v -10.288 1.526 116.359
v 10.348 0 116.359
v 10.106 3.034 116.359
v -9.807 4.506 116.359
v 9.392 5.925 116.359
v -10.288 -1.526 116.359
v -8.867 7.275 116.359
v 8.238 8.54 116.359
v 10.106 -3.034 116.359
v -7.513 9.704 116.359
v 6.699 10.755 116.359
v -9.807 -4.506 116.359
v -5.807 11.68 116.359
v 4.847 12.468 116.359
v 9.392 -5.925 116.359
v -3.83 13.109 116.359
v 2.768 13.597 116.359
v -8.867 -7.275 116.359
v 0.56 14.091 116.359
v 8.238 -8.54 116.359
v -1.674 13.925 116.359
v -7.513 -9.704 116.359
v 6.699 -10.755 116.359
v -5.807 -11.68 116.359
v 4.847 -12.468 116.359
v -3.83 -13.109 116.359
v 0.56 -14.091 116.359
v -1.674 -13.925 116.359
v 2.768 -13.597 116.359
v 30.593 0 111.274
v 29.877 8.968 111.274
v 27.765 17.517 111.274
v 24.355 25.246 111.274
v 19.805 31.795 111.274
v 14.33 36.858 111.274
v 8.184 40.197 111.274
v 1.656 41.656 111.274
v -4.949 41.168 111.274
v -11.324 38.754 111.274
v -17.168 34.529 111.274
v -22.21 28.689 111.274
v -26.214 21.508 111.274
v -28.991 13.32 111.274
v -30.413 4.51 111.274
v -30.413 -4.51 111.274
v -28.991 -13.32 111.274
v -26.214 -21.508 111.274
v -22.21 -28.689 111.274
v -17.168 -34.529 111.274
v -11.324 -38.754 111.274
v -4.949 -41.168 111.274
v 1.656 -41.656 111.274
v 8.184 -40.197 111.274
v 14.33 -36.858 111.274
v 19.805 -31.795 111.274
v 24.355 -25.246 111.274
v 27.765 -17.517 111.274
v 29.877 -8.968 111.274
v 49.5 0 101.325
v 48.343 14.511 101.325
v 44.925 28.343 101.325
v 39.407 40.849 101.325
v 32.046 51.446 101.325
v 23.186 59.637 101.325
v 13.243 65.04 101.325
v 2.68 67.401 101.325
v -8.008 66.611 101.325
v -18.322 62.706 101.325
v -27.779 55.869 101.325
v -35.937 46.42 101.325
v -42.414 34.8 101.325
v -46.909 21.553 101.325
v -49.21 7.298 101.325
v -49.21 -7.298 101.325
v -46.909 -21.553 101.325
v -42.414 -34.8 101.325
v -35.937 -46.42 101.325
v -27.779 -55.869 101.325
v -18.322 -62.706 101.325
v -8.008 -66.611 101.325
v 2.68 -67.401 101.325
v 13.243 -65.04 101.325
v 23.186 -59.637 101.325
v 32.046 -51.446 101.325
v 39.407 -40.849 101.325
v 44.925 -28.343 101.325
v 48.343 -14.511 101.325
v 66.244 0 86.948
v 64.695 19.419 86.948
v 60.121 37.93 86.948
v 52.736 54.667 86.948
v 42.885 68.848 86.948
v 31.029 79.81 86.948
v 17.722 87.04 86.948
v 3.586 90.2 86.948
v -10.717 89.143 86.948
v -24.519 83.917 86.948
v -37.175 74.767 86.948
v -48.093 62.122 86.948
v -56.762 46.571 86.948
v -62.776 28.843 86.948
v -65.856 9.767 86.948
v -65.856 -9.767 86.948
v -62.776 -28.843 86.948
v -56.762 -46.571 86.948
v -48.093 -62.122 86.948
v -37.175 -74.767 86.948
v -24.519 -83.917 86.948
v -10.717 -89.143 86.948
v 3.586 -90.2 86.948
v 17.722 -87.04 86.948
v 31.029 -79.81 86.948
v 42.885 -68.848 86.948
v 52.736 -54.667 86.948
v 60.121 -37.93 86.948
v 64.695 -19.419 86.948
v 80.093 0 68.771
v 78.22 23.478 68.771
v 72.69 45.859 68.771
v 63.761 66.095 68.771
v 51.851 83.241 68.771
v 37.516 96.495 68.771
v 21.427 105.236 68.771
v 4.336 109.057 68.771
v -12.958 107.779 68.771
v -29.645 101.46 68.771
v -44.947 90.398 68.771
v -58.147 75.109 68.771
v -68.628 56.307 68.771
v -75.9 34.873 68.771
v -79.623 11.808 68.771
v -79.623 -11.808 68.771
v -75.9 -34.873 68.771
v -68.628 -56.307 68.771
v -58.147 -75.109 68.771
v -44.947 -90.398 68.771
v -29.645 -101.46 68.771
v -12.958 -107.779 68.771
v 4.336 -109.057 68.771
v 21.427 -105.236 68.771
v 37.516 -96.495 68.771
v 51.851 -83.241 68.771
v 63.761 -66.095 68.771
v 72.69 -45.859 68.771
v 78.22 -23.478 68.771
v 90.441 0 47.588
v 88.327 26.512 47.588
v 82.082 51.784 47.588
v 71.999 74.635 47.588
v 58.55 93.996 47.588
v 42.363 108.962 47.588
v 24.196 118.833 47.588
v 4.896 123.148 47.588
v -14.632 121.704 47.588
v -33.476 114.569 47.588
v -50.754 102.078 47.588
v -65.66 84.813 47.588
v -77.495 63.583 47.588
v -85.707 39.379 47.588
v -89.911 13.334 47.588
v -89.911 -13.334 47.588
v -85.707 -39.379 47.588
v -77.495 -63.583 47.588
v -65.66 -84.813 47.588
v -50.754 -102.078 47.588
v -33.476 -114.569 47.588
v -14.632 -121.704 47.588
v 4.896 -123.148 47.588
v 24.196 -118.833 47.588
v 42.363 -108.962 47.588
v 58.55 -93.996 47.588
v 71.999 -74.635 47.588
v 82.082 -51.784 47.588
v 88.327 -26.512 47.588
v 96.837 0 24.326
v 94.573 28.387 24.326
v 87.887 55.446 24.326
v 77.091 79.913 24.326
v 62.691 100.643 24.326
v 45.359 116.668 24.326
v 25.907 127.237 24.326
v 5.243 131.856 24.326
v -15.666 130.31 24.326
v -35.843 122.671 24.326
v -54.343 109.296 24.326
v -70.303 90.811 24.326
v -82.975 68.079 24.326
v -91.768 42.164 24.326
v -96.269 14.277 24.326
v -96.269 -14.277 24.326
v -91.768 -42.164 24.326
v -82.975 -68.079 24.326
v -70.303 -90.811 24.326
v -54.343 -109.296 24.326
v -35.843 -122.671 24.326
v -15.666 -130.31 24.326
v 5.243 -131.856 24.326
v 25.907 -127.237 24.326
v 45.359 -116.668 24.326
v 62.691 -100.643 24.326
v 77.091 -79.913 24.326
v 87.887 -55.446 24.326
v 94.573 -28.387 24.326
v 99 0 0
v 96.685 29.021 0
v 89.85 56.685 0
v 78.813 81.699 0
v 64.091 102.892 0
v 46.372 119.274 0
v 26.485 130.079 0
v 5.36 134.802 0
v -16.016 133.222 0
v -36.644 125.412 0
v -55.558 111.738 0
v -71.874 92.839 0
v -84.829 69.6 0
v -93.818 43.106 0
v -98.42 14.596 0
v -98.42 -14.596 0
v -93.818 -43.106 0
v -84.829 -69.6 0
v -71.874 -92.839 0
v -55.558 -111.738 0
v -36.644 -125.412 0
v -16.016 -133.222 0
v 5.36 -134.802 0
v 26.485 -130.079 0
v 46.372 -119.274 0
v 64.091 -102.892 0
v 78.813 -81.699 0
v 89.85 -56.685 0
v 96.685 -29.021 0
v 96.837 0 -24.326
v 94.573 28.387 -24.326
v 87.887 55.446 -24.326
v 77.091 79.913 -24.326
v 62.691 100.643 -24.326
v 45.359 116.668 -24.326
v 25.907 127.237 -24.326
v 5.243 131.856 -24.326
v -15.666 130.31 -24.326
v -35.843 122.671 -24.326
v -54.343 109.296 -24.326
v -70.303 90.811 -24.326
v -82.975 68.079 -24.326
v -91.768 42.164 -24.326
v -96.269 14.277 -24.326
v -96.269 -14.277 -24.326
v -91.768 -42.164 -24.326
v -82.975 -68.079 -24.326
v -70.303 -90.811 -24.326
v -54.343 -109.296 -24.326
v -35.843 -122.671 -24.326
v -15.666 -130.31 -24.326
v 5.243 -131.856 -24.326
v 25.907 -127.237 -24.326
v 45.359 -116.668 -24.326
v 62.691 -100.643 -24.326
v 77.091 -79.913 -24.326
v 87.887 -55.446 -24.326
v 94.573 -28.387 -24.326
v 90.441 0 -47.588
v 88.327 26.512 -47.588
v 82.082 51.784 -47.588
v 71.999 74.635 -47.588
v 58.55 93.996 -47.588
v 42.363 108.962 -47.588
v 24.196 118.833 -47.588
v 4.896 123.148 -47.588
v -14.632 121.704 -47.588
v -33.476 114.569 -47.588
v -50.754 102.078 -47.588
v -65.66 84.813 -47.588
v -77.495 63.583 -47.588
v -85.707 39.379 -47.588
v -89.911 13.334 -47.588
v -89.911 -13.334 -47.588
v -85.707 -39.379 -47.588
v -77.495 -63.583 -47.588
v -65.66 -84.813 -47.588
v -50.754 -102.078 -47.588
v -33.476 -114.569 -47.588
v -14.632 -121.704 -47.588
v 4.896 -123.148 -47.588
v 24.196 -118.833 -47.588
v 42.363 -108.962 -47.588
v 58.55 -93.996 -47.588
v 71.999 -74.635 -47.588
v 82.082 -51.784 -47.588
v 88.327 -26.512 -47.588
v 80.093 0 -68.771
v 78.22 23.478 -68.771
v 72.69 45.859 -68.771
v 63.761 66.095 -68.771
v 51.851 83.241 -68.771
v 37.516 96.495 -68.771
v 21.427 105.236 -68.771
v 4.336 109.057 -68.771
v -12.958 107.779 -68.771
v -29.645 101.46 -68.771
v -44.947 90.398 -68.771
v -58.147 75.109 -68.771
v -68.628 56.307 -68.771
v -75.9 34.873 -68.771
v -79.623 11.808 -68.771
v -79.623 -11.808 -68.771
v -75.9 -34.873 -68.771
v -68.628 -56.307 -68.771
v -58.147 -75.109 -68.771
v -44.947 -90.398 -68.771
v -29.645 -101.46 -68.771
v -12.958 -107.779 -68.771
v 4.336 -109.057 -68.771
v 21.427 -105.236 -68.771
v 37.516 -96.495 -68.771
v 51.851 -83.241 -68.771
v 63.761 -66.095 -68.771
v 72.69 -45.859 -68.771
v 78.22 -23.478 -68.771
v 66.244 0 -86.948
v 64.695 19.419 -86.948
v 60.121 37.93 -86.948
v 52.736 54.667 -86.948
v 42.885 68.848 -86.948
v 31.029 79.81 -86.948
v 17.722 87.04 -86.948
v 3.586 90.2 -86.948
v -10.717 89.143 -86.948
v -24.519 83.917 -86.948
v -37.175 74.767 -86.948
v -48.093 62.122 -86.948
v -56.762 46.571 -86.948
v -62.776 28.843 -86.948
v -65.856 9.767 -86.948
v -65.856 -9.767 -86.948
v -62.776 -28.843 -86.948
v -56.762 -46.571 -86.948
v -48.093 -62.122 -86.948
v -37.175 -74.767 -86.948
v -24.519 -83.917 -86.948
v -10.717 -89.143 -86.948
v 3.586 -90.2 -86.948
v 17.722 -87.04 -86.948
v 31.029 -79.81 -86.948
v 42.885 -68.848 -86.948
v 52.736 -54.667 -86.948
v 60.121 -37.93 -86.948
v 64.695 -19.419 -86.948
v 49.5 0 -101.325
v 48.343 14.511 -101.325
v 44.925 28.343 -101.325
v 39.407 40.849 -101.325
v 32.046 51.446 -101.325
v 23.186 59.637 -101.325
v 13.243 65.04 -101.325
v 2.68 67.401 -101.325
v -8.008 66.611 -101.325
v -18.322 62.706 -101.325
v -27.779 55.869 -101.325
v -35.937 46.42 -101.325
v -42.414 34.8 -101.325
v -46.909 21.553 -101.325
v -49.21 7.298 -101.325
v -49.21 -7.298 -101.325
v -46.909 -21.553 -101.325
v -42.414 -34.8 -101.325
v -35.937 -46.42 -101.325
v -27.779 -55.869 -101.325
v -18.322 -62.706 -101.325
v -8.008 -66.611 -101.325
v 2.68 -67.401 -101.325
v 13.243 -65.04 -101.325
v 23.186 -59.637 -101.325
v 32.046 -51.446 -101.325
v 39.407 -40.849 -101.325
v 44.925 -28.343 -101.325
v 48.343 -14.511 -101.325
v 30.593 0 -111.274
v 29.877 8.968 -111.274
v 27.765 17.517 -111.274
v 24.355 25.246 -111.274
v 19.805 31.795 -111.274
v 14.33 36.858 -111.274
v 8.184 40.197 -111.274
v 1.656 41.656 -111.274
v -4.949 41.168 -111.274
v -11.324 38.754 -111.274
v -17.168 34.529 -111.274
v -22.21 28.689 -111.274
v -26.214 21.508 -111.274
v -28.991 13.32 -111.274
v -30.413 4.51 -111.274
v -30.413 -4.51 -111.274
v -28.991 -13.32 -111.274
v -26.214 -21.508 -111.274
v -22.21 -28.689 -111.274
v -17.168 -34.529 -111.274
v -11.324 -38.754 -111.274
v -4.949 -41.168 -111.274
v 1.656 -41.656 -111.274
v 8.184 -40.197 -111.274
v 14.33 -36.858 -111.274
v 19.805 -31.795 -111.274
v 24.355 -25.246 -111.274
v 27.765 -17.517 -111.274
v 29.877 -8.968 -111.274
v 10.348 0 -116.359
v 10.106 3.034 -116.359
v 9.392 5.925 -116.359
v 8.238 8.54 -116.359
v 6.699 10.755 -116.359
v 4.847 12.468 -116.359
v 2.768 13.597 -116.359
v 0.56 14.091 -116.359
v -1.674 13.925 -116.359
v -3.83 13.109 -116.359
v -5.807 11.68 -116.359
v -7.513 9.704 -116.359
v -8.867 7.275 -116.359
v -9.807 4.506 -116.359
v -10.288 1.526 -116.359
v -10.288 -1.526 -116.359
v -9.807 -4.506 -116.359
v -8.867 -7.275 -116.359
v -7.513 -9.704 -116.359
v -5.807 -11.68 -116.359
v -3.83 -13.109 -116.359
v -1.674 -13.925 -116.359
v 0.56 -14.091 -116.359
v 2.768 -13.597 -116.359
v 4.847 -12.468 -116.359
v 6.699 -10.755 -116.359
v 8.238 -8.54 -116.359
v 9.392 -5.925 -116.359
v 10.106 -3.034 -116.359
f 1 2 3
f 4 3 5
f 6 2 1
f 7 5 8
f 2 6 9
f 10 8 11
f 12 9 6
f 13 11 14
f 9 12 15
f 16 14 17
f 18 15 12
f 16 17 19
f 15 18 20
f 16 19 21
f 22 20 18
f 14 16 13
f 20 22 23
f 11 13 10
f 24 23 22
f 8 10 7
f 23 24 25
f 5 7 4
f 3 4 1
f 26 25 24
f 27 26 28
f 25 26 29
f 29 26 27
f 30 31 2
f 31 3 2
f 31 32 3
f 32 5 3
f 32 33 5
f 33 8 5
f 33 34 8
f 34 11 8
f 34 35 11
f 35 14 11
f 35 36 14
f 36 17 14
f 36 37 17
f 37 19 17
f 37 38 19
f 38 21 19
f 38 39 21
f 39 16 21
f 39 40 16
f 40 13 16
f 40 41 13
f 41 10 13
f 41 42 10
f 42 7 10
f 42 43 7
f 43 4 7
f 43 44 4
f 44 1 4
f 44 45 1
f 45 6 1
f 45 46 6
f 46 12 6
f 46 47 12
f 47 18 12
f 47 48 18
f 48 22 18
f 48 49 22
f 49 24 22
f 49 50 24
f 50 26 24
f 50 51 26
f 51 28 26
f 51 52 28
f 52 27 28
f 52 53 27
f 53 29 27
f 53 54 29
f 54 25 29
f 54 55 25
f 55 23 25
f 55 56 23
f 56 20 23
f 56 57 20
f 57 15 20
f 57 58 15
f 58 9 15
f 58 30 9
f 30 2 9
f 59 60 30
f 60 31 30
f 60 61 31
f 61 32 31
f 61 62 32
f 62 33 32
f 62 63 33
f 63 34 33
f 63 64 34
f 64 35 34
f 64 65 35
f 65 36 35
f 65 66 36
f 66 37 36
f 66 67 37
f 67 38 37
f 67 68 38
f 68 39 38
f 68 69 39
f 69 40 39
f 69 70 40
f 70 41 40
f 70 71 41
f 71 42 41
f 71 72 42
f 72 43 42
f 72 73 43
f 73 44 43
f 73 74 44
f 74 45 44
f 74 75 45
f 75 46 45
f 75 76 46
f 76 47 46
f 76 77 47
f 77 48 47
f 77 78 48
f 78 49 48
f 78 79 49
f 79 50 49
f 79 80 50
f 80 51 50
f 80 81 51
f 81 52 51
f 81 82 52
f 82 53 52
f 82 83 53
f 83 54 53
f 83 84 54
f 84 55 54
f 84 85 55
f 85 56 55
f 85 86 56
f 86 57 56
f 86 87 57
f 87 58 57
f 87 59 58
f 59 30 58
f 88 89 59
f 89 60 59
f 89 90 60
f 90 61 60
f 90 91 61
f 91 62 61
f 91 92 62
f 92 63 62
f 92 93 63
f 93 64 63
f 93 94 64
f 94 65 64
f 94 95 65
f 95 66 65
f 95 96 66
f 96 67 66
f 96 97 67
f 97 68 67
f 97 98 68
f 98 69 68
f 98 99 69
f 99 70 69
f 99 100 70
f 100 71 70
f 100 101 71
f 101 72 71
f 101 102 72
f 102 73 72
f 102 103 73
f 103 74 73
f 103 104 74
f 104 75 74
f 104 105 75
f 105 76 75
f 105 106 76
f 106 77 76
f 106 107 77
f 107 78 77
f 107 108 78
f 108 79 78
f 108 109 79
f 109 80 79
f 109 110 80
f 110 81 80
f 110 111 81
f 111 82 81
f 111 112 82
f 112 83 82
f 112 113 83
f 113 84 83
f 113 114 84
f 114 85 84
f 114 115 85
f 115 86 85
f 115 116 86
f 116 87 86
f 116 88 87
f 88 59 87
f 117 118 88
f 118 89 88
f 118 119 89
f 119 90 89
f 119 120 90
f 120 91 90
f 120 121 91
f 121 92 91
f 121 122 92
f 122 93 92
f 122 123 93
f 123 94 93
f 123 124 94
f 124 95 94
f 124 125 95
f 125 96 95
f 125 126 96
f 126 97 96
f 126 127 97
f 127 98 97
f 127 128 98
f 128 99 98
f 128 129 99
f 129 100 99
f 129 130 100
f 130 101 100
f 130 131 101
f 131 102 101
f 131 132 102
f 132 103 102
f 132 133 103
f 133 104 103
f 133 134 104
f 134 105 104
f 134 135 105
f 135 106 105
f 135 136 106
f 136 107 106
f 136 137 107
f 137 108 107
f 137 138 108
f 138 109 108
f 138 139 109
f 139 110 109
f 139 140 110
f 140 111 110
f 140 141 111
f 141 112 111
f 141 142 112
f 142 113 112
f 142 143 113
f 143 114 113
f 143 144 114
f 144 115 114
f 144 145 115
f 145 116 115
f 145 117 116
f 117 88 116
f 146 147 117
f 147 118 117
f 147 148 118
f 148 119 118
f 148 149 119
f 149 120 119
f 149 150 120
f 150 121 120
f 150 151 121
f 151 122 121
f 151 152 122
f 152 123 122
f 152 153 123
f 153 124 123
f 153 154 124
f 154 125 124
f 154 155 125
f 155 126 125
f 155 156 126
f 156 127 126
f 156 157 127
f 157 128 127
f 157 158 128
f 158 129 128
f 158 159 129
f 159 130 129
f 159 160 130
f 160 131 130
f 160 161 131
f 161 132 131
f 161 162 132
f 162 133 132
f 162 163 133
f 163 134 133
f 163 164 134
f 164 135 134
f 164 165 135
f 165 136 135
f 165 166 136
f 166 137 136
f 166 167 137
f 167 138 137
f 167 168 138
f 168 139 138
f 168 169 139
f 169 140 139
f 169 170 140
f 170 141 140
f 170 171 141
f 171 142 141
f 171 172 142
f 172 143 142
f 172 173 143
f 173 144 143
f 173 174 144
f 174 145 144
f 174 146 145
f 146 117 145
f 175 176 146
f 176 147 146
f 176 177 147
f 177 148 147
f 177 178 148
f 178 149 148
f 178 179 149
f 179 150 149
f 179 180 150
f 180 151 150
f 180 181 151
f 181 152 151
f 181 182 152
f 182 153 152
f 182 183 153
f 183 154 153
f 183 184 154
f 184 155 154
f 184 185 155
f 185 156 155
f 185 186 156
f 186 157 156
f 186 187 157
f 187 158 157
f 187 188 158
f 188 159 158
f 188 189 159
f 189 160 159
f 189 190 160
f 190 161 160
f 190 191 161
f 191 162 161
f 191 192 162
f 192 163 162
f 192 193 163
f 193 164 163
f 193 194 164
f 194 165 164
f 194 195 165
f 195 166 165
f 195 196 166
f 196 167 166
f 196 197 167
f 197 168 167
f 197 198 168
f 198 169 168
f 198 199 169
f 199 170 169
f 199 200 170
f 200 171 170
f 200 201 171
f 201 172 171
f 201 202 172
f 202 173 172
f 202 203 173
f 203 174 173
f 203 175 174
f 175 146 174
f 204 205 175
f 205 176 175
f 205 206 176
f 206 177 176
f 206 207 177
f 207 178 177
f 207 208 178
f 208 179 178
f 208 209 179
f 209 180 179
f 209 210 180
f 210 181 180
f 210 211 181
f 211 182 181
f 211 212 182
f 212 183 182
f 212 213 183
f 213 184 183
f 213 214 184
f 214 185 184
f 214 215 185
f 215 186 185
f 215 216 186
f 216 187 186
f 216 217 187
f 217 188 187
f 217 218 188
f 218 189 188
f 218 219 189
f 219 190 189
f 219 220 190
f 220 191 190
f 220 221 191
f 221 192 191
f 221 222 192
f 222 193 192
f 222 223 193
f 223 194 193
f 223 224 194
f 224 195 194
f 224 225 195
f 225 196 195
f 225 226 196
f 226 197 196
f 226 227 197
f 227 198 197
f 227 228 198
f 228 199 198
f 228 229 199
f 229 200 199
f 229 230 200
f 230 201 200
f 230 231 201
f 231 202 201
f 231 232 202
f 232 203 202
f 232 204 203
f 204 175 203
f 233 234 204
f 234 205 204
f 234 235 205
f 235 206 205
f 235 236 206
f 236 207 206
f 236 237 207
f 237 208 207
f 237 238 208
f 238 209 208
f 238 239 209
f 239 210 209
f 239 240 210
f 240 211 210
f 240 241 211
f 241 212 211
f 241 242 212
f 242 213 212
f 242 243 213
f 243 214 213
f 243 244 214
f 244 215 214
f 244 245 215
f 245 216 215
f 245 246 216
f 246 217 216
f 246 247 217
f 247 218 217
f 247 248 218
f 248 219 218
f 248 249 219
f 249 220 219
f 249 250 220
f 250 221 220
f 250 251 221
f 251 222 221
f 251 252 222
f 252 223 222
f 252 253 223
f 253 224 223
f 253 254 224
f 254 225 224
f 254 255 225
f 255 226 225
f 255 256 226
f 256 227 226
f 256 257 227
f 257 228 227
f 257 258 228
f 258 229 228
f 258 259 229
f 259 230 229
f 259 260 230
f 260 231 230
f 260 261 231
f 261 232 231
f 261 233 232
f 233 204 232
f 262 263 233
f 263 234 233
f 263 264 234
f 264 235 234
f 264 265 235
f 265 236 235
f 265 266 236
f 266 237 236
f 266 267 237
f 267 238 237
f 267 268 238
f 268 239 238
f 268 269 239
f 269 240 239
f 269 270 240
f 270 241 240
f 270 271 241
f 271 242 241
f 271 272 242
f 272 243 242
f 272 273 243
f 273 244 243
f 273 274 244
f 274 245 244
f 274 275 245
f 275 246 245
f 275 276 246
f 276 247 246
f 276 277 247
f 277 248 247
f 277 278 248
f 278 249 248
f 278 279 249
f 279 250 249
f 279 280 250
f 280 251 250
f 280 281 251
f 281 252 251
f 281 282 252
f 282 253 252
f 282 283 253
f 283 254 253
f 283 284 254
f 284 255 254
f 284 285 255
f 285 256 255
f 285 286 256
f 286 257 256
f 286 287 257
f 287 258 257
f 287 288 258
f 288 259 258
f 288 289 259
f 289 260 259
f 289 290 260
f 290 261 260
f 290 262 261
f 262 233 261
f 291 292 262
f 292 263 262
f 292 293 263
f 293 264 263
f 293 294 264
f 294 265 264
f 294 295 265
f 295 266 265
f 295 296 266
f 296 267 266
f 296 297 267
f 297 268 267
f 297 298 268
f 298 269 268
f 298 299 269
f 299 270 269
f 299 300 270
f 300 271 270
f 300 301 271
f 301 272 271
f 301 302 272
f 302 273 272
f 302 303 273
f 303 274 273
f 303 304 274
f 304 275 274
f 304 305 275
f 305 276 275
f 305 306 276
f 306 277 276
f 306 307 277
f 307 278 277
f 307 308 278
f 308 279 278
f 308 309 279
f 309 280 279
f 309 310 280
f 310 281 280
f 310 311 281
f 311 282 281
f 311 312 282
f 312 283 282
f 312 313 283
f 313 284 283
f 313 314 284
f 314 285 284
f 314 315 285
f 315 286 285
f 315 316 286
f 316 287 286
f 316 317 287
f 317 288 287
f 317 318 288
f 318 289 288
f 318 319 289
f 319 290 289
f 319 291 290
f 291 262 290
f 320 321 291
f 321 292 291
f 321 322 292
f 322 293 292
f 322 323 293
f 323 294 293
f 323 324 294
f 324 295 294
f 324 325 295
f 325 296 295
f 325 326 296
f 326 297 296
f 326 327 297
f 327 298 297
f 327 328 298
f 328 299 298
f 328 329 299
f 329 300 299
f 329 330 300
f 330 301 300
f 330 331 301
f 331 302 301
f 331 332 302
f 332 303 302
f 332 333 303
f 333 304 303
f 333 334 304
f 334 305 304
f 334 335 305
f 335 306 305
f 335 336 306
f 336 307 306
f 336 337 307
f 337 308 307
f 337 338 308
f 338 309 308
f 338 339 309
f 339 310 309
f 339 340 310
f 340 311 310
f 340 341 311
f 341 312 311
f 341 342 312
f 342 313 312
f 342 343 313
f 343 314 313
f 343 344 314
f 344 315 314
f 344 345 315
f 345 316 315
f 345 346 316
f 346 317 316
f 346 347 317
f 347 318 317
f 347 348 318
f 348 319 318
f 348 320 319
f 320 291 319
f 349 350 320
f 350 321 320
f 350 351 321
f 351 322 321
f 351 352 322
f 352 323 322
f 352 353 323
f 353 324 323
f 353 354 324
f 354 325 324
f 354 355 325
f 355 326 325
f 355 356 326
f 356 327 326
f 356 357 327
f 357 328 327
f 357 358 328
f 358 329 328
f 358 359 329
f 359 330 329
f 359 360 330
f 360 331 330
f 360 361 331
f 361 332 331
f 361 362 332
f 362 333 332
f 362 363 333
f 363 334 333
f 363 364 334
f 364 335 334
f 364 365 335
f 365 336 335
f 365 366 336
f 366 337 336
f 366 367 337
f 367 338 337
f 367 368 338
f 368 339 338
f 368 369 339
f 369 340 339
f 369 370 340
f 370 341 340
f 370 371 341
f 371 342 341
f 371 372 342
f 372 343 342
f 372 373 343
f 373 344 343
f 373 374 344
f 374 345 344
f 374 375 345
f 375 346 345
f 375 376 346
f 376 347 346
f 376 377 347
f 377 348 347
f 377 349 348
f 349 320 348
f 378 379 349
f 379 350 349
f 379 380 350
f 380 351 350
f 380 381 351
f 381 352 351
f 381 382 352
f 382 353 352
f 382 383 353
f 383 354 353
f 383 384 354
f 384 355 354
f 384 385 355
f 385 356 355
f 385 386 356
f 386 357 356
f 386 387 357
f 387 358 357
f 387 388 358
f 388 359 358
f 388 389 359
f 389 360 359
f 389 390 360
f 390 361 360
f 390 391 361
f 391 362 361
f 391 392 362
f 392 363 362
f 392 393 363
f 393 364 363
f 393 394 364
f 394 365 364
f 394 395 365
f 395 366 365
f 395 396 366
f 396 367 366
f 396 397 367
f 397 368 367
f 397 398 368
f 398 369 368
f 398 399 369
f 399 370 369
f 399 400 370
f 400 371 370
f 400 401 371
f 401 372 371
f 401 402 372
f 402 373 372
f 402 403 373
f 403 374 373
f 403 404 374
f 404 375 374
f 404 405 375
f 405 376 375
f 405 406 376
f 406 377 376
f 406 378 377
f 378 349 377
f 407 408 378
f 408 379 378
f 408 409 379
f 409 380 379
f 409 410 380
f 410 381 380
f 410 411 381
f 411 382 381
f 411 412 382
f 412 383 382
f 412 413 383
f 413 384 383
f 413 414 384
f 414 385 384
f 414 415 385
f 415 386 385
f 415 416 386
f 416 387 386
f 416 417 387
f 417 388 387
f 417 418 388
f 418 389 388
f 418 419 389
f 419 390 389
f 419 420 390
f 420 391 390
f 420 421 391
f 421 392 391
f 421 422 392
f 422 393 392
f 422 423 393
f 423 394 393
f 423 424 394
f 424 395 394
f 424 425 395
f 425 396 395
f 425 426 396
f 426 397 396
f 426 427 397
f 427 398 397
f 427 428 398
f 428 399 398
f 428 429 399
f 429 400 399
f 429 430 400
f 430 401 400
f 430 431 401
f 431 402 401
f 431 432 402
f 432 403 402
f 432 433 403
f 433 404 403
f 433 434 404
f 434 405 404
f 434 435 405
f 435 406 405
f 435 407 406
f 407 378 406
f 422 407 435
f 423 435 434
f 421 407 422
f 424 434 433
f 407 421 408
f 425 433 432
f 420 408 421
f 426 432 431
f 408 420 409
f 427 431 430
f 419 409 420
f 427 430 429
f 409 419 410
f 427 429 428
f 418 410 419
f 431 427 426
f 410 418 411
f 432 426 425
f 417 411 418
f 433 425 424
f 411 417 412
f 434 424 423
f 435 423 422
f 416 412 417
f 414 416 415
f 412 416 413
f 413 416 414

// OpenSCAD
// Generated by SolidPython 1.0.1 on 2020-07-29 00:46:50


scale(v = [11, 15, 13]) {
	sphere(r = 9);
}
/***********************************************
*********      SolidPython code:      **********
************************************************
 
# import packages: SolidPython
from solid import *
from solid.utils import *
from itertools import chain, combinations, permutations


class Resize:

    def __init__(self, scad_file):
        self.scad_file = scad_file
        #self.scad_file = import_scad(scad_file)
        # cone/cylinder param:
        self.r1 = 0
        self.r2 = 0
        self.h = 0
        # rectangular prism param:
        self.w = 0
        self.l = 0
        # ellipse param:
        self.r = 0

    # import OpenScad code (file name corresponds to shape)


    # classify shape + parameters
    def assign(self, param1, param2, param3):
        if self.scad_file == 'cone.scad':
            self.r1 = param1
            self.r2 = param2
            self.h = param3
        elif self.scad_file == 'cylinder.scad':
            self.r1 = param1
            self.r2 = param2
            self.h = param3
        elif self.scad_file == 'rectangularPrism.scad':
            self.h = param1
            self.l = param2
            self.w = param3
        else:
            self.r = param1
            self.h = param2

    # resize parameters
    def iterate(self):
        x = range(3, 20, 2)
        i = 1
        if self.scad_file == 'cone.scad':
            tempList = list(permutations(x, 2))
            for temp in tempList:
                param1 = temp[0]
                param2 = temp[1]
                filepath = 'produced_scad_files/' + 'cone' + str(param1) + '_' + str(param2) + '_' + '.scad'
                scad_render_to_file(cylinder(h=param1, r1=param2, r2=0), filepath)

        elif self.scad_file == 'cylinder.scad':
            tempList = list(permutations(x, 3))
            for temp in tempList:
                param1 = temp[0]
                param2 = temp[1]
                filepath = 'produced_scad_files/' + 'cylinder' + str(param1) + '_' + str(param2) + '_' + '.scad'
                scad_render_to_file(cylinder(h=param1, r1=param2, r2=param2), filepath)

        elif self.scad_file == 'rectangularPrism.scad':
            tempList = list(permutations(x, 3))
            for temp in tempList:
                param1 = temp[0]
                param2 = temp[1]
                param3 = temp[2]
                filepath = 'produced_scad_files/' + 'rectangularPrism' + str(param1) + '_' + str(param2) + '_' + str(
                    param3) + '.scad'
                scad_render_to_file(cube(size=(param1, param2, param3)), filepath)

        elif self.scad_file == 'ellipse.scad':
            tempList = list(permutations(x, 4))
            for temp in tempList:
                param1 = temp[0]
                param2 = temp[1]
                param3 = temp[2]
                param4 = temp[3]
                filepath = 'produced_scad_files/' + 'ellipse' + str(param1) + '_' + str(param2) + '_' + str(param3) + '_' + str(param4) + '.scad'
                scad_render_to_file(scale([param1, param2, param3])(sphere(r=param4)), filepath)

    def render_to_scadfile(self):
        scad_render_to_file(scad, 'example.scad') 
 
************************************************/
